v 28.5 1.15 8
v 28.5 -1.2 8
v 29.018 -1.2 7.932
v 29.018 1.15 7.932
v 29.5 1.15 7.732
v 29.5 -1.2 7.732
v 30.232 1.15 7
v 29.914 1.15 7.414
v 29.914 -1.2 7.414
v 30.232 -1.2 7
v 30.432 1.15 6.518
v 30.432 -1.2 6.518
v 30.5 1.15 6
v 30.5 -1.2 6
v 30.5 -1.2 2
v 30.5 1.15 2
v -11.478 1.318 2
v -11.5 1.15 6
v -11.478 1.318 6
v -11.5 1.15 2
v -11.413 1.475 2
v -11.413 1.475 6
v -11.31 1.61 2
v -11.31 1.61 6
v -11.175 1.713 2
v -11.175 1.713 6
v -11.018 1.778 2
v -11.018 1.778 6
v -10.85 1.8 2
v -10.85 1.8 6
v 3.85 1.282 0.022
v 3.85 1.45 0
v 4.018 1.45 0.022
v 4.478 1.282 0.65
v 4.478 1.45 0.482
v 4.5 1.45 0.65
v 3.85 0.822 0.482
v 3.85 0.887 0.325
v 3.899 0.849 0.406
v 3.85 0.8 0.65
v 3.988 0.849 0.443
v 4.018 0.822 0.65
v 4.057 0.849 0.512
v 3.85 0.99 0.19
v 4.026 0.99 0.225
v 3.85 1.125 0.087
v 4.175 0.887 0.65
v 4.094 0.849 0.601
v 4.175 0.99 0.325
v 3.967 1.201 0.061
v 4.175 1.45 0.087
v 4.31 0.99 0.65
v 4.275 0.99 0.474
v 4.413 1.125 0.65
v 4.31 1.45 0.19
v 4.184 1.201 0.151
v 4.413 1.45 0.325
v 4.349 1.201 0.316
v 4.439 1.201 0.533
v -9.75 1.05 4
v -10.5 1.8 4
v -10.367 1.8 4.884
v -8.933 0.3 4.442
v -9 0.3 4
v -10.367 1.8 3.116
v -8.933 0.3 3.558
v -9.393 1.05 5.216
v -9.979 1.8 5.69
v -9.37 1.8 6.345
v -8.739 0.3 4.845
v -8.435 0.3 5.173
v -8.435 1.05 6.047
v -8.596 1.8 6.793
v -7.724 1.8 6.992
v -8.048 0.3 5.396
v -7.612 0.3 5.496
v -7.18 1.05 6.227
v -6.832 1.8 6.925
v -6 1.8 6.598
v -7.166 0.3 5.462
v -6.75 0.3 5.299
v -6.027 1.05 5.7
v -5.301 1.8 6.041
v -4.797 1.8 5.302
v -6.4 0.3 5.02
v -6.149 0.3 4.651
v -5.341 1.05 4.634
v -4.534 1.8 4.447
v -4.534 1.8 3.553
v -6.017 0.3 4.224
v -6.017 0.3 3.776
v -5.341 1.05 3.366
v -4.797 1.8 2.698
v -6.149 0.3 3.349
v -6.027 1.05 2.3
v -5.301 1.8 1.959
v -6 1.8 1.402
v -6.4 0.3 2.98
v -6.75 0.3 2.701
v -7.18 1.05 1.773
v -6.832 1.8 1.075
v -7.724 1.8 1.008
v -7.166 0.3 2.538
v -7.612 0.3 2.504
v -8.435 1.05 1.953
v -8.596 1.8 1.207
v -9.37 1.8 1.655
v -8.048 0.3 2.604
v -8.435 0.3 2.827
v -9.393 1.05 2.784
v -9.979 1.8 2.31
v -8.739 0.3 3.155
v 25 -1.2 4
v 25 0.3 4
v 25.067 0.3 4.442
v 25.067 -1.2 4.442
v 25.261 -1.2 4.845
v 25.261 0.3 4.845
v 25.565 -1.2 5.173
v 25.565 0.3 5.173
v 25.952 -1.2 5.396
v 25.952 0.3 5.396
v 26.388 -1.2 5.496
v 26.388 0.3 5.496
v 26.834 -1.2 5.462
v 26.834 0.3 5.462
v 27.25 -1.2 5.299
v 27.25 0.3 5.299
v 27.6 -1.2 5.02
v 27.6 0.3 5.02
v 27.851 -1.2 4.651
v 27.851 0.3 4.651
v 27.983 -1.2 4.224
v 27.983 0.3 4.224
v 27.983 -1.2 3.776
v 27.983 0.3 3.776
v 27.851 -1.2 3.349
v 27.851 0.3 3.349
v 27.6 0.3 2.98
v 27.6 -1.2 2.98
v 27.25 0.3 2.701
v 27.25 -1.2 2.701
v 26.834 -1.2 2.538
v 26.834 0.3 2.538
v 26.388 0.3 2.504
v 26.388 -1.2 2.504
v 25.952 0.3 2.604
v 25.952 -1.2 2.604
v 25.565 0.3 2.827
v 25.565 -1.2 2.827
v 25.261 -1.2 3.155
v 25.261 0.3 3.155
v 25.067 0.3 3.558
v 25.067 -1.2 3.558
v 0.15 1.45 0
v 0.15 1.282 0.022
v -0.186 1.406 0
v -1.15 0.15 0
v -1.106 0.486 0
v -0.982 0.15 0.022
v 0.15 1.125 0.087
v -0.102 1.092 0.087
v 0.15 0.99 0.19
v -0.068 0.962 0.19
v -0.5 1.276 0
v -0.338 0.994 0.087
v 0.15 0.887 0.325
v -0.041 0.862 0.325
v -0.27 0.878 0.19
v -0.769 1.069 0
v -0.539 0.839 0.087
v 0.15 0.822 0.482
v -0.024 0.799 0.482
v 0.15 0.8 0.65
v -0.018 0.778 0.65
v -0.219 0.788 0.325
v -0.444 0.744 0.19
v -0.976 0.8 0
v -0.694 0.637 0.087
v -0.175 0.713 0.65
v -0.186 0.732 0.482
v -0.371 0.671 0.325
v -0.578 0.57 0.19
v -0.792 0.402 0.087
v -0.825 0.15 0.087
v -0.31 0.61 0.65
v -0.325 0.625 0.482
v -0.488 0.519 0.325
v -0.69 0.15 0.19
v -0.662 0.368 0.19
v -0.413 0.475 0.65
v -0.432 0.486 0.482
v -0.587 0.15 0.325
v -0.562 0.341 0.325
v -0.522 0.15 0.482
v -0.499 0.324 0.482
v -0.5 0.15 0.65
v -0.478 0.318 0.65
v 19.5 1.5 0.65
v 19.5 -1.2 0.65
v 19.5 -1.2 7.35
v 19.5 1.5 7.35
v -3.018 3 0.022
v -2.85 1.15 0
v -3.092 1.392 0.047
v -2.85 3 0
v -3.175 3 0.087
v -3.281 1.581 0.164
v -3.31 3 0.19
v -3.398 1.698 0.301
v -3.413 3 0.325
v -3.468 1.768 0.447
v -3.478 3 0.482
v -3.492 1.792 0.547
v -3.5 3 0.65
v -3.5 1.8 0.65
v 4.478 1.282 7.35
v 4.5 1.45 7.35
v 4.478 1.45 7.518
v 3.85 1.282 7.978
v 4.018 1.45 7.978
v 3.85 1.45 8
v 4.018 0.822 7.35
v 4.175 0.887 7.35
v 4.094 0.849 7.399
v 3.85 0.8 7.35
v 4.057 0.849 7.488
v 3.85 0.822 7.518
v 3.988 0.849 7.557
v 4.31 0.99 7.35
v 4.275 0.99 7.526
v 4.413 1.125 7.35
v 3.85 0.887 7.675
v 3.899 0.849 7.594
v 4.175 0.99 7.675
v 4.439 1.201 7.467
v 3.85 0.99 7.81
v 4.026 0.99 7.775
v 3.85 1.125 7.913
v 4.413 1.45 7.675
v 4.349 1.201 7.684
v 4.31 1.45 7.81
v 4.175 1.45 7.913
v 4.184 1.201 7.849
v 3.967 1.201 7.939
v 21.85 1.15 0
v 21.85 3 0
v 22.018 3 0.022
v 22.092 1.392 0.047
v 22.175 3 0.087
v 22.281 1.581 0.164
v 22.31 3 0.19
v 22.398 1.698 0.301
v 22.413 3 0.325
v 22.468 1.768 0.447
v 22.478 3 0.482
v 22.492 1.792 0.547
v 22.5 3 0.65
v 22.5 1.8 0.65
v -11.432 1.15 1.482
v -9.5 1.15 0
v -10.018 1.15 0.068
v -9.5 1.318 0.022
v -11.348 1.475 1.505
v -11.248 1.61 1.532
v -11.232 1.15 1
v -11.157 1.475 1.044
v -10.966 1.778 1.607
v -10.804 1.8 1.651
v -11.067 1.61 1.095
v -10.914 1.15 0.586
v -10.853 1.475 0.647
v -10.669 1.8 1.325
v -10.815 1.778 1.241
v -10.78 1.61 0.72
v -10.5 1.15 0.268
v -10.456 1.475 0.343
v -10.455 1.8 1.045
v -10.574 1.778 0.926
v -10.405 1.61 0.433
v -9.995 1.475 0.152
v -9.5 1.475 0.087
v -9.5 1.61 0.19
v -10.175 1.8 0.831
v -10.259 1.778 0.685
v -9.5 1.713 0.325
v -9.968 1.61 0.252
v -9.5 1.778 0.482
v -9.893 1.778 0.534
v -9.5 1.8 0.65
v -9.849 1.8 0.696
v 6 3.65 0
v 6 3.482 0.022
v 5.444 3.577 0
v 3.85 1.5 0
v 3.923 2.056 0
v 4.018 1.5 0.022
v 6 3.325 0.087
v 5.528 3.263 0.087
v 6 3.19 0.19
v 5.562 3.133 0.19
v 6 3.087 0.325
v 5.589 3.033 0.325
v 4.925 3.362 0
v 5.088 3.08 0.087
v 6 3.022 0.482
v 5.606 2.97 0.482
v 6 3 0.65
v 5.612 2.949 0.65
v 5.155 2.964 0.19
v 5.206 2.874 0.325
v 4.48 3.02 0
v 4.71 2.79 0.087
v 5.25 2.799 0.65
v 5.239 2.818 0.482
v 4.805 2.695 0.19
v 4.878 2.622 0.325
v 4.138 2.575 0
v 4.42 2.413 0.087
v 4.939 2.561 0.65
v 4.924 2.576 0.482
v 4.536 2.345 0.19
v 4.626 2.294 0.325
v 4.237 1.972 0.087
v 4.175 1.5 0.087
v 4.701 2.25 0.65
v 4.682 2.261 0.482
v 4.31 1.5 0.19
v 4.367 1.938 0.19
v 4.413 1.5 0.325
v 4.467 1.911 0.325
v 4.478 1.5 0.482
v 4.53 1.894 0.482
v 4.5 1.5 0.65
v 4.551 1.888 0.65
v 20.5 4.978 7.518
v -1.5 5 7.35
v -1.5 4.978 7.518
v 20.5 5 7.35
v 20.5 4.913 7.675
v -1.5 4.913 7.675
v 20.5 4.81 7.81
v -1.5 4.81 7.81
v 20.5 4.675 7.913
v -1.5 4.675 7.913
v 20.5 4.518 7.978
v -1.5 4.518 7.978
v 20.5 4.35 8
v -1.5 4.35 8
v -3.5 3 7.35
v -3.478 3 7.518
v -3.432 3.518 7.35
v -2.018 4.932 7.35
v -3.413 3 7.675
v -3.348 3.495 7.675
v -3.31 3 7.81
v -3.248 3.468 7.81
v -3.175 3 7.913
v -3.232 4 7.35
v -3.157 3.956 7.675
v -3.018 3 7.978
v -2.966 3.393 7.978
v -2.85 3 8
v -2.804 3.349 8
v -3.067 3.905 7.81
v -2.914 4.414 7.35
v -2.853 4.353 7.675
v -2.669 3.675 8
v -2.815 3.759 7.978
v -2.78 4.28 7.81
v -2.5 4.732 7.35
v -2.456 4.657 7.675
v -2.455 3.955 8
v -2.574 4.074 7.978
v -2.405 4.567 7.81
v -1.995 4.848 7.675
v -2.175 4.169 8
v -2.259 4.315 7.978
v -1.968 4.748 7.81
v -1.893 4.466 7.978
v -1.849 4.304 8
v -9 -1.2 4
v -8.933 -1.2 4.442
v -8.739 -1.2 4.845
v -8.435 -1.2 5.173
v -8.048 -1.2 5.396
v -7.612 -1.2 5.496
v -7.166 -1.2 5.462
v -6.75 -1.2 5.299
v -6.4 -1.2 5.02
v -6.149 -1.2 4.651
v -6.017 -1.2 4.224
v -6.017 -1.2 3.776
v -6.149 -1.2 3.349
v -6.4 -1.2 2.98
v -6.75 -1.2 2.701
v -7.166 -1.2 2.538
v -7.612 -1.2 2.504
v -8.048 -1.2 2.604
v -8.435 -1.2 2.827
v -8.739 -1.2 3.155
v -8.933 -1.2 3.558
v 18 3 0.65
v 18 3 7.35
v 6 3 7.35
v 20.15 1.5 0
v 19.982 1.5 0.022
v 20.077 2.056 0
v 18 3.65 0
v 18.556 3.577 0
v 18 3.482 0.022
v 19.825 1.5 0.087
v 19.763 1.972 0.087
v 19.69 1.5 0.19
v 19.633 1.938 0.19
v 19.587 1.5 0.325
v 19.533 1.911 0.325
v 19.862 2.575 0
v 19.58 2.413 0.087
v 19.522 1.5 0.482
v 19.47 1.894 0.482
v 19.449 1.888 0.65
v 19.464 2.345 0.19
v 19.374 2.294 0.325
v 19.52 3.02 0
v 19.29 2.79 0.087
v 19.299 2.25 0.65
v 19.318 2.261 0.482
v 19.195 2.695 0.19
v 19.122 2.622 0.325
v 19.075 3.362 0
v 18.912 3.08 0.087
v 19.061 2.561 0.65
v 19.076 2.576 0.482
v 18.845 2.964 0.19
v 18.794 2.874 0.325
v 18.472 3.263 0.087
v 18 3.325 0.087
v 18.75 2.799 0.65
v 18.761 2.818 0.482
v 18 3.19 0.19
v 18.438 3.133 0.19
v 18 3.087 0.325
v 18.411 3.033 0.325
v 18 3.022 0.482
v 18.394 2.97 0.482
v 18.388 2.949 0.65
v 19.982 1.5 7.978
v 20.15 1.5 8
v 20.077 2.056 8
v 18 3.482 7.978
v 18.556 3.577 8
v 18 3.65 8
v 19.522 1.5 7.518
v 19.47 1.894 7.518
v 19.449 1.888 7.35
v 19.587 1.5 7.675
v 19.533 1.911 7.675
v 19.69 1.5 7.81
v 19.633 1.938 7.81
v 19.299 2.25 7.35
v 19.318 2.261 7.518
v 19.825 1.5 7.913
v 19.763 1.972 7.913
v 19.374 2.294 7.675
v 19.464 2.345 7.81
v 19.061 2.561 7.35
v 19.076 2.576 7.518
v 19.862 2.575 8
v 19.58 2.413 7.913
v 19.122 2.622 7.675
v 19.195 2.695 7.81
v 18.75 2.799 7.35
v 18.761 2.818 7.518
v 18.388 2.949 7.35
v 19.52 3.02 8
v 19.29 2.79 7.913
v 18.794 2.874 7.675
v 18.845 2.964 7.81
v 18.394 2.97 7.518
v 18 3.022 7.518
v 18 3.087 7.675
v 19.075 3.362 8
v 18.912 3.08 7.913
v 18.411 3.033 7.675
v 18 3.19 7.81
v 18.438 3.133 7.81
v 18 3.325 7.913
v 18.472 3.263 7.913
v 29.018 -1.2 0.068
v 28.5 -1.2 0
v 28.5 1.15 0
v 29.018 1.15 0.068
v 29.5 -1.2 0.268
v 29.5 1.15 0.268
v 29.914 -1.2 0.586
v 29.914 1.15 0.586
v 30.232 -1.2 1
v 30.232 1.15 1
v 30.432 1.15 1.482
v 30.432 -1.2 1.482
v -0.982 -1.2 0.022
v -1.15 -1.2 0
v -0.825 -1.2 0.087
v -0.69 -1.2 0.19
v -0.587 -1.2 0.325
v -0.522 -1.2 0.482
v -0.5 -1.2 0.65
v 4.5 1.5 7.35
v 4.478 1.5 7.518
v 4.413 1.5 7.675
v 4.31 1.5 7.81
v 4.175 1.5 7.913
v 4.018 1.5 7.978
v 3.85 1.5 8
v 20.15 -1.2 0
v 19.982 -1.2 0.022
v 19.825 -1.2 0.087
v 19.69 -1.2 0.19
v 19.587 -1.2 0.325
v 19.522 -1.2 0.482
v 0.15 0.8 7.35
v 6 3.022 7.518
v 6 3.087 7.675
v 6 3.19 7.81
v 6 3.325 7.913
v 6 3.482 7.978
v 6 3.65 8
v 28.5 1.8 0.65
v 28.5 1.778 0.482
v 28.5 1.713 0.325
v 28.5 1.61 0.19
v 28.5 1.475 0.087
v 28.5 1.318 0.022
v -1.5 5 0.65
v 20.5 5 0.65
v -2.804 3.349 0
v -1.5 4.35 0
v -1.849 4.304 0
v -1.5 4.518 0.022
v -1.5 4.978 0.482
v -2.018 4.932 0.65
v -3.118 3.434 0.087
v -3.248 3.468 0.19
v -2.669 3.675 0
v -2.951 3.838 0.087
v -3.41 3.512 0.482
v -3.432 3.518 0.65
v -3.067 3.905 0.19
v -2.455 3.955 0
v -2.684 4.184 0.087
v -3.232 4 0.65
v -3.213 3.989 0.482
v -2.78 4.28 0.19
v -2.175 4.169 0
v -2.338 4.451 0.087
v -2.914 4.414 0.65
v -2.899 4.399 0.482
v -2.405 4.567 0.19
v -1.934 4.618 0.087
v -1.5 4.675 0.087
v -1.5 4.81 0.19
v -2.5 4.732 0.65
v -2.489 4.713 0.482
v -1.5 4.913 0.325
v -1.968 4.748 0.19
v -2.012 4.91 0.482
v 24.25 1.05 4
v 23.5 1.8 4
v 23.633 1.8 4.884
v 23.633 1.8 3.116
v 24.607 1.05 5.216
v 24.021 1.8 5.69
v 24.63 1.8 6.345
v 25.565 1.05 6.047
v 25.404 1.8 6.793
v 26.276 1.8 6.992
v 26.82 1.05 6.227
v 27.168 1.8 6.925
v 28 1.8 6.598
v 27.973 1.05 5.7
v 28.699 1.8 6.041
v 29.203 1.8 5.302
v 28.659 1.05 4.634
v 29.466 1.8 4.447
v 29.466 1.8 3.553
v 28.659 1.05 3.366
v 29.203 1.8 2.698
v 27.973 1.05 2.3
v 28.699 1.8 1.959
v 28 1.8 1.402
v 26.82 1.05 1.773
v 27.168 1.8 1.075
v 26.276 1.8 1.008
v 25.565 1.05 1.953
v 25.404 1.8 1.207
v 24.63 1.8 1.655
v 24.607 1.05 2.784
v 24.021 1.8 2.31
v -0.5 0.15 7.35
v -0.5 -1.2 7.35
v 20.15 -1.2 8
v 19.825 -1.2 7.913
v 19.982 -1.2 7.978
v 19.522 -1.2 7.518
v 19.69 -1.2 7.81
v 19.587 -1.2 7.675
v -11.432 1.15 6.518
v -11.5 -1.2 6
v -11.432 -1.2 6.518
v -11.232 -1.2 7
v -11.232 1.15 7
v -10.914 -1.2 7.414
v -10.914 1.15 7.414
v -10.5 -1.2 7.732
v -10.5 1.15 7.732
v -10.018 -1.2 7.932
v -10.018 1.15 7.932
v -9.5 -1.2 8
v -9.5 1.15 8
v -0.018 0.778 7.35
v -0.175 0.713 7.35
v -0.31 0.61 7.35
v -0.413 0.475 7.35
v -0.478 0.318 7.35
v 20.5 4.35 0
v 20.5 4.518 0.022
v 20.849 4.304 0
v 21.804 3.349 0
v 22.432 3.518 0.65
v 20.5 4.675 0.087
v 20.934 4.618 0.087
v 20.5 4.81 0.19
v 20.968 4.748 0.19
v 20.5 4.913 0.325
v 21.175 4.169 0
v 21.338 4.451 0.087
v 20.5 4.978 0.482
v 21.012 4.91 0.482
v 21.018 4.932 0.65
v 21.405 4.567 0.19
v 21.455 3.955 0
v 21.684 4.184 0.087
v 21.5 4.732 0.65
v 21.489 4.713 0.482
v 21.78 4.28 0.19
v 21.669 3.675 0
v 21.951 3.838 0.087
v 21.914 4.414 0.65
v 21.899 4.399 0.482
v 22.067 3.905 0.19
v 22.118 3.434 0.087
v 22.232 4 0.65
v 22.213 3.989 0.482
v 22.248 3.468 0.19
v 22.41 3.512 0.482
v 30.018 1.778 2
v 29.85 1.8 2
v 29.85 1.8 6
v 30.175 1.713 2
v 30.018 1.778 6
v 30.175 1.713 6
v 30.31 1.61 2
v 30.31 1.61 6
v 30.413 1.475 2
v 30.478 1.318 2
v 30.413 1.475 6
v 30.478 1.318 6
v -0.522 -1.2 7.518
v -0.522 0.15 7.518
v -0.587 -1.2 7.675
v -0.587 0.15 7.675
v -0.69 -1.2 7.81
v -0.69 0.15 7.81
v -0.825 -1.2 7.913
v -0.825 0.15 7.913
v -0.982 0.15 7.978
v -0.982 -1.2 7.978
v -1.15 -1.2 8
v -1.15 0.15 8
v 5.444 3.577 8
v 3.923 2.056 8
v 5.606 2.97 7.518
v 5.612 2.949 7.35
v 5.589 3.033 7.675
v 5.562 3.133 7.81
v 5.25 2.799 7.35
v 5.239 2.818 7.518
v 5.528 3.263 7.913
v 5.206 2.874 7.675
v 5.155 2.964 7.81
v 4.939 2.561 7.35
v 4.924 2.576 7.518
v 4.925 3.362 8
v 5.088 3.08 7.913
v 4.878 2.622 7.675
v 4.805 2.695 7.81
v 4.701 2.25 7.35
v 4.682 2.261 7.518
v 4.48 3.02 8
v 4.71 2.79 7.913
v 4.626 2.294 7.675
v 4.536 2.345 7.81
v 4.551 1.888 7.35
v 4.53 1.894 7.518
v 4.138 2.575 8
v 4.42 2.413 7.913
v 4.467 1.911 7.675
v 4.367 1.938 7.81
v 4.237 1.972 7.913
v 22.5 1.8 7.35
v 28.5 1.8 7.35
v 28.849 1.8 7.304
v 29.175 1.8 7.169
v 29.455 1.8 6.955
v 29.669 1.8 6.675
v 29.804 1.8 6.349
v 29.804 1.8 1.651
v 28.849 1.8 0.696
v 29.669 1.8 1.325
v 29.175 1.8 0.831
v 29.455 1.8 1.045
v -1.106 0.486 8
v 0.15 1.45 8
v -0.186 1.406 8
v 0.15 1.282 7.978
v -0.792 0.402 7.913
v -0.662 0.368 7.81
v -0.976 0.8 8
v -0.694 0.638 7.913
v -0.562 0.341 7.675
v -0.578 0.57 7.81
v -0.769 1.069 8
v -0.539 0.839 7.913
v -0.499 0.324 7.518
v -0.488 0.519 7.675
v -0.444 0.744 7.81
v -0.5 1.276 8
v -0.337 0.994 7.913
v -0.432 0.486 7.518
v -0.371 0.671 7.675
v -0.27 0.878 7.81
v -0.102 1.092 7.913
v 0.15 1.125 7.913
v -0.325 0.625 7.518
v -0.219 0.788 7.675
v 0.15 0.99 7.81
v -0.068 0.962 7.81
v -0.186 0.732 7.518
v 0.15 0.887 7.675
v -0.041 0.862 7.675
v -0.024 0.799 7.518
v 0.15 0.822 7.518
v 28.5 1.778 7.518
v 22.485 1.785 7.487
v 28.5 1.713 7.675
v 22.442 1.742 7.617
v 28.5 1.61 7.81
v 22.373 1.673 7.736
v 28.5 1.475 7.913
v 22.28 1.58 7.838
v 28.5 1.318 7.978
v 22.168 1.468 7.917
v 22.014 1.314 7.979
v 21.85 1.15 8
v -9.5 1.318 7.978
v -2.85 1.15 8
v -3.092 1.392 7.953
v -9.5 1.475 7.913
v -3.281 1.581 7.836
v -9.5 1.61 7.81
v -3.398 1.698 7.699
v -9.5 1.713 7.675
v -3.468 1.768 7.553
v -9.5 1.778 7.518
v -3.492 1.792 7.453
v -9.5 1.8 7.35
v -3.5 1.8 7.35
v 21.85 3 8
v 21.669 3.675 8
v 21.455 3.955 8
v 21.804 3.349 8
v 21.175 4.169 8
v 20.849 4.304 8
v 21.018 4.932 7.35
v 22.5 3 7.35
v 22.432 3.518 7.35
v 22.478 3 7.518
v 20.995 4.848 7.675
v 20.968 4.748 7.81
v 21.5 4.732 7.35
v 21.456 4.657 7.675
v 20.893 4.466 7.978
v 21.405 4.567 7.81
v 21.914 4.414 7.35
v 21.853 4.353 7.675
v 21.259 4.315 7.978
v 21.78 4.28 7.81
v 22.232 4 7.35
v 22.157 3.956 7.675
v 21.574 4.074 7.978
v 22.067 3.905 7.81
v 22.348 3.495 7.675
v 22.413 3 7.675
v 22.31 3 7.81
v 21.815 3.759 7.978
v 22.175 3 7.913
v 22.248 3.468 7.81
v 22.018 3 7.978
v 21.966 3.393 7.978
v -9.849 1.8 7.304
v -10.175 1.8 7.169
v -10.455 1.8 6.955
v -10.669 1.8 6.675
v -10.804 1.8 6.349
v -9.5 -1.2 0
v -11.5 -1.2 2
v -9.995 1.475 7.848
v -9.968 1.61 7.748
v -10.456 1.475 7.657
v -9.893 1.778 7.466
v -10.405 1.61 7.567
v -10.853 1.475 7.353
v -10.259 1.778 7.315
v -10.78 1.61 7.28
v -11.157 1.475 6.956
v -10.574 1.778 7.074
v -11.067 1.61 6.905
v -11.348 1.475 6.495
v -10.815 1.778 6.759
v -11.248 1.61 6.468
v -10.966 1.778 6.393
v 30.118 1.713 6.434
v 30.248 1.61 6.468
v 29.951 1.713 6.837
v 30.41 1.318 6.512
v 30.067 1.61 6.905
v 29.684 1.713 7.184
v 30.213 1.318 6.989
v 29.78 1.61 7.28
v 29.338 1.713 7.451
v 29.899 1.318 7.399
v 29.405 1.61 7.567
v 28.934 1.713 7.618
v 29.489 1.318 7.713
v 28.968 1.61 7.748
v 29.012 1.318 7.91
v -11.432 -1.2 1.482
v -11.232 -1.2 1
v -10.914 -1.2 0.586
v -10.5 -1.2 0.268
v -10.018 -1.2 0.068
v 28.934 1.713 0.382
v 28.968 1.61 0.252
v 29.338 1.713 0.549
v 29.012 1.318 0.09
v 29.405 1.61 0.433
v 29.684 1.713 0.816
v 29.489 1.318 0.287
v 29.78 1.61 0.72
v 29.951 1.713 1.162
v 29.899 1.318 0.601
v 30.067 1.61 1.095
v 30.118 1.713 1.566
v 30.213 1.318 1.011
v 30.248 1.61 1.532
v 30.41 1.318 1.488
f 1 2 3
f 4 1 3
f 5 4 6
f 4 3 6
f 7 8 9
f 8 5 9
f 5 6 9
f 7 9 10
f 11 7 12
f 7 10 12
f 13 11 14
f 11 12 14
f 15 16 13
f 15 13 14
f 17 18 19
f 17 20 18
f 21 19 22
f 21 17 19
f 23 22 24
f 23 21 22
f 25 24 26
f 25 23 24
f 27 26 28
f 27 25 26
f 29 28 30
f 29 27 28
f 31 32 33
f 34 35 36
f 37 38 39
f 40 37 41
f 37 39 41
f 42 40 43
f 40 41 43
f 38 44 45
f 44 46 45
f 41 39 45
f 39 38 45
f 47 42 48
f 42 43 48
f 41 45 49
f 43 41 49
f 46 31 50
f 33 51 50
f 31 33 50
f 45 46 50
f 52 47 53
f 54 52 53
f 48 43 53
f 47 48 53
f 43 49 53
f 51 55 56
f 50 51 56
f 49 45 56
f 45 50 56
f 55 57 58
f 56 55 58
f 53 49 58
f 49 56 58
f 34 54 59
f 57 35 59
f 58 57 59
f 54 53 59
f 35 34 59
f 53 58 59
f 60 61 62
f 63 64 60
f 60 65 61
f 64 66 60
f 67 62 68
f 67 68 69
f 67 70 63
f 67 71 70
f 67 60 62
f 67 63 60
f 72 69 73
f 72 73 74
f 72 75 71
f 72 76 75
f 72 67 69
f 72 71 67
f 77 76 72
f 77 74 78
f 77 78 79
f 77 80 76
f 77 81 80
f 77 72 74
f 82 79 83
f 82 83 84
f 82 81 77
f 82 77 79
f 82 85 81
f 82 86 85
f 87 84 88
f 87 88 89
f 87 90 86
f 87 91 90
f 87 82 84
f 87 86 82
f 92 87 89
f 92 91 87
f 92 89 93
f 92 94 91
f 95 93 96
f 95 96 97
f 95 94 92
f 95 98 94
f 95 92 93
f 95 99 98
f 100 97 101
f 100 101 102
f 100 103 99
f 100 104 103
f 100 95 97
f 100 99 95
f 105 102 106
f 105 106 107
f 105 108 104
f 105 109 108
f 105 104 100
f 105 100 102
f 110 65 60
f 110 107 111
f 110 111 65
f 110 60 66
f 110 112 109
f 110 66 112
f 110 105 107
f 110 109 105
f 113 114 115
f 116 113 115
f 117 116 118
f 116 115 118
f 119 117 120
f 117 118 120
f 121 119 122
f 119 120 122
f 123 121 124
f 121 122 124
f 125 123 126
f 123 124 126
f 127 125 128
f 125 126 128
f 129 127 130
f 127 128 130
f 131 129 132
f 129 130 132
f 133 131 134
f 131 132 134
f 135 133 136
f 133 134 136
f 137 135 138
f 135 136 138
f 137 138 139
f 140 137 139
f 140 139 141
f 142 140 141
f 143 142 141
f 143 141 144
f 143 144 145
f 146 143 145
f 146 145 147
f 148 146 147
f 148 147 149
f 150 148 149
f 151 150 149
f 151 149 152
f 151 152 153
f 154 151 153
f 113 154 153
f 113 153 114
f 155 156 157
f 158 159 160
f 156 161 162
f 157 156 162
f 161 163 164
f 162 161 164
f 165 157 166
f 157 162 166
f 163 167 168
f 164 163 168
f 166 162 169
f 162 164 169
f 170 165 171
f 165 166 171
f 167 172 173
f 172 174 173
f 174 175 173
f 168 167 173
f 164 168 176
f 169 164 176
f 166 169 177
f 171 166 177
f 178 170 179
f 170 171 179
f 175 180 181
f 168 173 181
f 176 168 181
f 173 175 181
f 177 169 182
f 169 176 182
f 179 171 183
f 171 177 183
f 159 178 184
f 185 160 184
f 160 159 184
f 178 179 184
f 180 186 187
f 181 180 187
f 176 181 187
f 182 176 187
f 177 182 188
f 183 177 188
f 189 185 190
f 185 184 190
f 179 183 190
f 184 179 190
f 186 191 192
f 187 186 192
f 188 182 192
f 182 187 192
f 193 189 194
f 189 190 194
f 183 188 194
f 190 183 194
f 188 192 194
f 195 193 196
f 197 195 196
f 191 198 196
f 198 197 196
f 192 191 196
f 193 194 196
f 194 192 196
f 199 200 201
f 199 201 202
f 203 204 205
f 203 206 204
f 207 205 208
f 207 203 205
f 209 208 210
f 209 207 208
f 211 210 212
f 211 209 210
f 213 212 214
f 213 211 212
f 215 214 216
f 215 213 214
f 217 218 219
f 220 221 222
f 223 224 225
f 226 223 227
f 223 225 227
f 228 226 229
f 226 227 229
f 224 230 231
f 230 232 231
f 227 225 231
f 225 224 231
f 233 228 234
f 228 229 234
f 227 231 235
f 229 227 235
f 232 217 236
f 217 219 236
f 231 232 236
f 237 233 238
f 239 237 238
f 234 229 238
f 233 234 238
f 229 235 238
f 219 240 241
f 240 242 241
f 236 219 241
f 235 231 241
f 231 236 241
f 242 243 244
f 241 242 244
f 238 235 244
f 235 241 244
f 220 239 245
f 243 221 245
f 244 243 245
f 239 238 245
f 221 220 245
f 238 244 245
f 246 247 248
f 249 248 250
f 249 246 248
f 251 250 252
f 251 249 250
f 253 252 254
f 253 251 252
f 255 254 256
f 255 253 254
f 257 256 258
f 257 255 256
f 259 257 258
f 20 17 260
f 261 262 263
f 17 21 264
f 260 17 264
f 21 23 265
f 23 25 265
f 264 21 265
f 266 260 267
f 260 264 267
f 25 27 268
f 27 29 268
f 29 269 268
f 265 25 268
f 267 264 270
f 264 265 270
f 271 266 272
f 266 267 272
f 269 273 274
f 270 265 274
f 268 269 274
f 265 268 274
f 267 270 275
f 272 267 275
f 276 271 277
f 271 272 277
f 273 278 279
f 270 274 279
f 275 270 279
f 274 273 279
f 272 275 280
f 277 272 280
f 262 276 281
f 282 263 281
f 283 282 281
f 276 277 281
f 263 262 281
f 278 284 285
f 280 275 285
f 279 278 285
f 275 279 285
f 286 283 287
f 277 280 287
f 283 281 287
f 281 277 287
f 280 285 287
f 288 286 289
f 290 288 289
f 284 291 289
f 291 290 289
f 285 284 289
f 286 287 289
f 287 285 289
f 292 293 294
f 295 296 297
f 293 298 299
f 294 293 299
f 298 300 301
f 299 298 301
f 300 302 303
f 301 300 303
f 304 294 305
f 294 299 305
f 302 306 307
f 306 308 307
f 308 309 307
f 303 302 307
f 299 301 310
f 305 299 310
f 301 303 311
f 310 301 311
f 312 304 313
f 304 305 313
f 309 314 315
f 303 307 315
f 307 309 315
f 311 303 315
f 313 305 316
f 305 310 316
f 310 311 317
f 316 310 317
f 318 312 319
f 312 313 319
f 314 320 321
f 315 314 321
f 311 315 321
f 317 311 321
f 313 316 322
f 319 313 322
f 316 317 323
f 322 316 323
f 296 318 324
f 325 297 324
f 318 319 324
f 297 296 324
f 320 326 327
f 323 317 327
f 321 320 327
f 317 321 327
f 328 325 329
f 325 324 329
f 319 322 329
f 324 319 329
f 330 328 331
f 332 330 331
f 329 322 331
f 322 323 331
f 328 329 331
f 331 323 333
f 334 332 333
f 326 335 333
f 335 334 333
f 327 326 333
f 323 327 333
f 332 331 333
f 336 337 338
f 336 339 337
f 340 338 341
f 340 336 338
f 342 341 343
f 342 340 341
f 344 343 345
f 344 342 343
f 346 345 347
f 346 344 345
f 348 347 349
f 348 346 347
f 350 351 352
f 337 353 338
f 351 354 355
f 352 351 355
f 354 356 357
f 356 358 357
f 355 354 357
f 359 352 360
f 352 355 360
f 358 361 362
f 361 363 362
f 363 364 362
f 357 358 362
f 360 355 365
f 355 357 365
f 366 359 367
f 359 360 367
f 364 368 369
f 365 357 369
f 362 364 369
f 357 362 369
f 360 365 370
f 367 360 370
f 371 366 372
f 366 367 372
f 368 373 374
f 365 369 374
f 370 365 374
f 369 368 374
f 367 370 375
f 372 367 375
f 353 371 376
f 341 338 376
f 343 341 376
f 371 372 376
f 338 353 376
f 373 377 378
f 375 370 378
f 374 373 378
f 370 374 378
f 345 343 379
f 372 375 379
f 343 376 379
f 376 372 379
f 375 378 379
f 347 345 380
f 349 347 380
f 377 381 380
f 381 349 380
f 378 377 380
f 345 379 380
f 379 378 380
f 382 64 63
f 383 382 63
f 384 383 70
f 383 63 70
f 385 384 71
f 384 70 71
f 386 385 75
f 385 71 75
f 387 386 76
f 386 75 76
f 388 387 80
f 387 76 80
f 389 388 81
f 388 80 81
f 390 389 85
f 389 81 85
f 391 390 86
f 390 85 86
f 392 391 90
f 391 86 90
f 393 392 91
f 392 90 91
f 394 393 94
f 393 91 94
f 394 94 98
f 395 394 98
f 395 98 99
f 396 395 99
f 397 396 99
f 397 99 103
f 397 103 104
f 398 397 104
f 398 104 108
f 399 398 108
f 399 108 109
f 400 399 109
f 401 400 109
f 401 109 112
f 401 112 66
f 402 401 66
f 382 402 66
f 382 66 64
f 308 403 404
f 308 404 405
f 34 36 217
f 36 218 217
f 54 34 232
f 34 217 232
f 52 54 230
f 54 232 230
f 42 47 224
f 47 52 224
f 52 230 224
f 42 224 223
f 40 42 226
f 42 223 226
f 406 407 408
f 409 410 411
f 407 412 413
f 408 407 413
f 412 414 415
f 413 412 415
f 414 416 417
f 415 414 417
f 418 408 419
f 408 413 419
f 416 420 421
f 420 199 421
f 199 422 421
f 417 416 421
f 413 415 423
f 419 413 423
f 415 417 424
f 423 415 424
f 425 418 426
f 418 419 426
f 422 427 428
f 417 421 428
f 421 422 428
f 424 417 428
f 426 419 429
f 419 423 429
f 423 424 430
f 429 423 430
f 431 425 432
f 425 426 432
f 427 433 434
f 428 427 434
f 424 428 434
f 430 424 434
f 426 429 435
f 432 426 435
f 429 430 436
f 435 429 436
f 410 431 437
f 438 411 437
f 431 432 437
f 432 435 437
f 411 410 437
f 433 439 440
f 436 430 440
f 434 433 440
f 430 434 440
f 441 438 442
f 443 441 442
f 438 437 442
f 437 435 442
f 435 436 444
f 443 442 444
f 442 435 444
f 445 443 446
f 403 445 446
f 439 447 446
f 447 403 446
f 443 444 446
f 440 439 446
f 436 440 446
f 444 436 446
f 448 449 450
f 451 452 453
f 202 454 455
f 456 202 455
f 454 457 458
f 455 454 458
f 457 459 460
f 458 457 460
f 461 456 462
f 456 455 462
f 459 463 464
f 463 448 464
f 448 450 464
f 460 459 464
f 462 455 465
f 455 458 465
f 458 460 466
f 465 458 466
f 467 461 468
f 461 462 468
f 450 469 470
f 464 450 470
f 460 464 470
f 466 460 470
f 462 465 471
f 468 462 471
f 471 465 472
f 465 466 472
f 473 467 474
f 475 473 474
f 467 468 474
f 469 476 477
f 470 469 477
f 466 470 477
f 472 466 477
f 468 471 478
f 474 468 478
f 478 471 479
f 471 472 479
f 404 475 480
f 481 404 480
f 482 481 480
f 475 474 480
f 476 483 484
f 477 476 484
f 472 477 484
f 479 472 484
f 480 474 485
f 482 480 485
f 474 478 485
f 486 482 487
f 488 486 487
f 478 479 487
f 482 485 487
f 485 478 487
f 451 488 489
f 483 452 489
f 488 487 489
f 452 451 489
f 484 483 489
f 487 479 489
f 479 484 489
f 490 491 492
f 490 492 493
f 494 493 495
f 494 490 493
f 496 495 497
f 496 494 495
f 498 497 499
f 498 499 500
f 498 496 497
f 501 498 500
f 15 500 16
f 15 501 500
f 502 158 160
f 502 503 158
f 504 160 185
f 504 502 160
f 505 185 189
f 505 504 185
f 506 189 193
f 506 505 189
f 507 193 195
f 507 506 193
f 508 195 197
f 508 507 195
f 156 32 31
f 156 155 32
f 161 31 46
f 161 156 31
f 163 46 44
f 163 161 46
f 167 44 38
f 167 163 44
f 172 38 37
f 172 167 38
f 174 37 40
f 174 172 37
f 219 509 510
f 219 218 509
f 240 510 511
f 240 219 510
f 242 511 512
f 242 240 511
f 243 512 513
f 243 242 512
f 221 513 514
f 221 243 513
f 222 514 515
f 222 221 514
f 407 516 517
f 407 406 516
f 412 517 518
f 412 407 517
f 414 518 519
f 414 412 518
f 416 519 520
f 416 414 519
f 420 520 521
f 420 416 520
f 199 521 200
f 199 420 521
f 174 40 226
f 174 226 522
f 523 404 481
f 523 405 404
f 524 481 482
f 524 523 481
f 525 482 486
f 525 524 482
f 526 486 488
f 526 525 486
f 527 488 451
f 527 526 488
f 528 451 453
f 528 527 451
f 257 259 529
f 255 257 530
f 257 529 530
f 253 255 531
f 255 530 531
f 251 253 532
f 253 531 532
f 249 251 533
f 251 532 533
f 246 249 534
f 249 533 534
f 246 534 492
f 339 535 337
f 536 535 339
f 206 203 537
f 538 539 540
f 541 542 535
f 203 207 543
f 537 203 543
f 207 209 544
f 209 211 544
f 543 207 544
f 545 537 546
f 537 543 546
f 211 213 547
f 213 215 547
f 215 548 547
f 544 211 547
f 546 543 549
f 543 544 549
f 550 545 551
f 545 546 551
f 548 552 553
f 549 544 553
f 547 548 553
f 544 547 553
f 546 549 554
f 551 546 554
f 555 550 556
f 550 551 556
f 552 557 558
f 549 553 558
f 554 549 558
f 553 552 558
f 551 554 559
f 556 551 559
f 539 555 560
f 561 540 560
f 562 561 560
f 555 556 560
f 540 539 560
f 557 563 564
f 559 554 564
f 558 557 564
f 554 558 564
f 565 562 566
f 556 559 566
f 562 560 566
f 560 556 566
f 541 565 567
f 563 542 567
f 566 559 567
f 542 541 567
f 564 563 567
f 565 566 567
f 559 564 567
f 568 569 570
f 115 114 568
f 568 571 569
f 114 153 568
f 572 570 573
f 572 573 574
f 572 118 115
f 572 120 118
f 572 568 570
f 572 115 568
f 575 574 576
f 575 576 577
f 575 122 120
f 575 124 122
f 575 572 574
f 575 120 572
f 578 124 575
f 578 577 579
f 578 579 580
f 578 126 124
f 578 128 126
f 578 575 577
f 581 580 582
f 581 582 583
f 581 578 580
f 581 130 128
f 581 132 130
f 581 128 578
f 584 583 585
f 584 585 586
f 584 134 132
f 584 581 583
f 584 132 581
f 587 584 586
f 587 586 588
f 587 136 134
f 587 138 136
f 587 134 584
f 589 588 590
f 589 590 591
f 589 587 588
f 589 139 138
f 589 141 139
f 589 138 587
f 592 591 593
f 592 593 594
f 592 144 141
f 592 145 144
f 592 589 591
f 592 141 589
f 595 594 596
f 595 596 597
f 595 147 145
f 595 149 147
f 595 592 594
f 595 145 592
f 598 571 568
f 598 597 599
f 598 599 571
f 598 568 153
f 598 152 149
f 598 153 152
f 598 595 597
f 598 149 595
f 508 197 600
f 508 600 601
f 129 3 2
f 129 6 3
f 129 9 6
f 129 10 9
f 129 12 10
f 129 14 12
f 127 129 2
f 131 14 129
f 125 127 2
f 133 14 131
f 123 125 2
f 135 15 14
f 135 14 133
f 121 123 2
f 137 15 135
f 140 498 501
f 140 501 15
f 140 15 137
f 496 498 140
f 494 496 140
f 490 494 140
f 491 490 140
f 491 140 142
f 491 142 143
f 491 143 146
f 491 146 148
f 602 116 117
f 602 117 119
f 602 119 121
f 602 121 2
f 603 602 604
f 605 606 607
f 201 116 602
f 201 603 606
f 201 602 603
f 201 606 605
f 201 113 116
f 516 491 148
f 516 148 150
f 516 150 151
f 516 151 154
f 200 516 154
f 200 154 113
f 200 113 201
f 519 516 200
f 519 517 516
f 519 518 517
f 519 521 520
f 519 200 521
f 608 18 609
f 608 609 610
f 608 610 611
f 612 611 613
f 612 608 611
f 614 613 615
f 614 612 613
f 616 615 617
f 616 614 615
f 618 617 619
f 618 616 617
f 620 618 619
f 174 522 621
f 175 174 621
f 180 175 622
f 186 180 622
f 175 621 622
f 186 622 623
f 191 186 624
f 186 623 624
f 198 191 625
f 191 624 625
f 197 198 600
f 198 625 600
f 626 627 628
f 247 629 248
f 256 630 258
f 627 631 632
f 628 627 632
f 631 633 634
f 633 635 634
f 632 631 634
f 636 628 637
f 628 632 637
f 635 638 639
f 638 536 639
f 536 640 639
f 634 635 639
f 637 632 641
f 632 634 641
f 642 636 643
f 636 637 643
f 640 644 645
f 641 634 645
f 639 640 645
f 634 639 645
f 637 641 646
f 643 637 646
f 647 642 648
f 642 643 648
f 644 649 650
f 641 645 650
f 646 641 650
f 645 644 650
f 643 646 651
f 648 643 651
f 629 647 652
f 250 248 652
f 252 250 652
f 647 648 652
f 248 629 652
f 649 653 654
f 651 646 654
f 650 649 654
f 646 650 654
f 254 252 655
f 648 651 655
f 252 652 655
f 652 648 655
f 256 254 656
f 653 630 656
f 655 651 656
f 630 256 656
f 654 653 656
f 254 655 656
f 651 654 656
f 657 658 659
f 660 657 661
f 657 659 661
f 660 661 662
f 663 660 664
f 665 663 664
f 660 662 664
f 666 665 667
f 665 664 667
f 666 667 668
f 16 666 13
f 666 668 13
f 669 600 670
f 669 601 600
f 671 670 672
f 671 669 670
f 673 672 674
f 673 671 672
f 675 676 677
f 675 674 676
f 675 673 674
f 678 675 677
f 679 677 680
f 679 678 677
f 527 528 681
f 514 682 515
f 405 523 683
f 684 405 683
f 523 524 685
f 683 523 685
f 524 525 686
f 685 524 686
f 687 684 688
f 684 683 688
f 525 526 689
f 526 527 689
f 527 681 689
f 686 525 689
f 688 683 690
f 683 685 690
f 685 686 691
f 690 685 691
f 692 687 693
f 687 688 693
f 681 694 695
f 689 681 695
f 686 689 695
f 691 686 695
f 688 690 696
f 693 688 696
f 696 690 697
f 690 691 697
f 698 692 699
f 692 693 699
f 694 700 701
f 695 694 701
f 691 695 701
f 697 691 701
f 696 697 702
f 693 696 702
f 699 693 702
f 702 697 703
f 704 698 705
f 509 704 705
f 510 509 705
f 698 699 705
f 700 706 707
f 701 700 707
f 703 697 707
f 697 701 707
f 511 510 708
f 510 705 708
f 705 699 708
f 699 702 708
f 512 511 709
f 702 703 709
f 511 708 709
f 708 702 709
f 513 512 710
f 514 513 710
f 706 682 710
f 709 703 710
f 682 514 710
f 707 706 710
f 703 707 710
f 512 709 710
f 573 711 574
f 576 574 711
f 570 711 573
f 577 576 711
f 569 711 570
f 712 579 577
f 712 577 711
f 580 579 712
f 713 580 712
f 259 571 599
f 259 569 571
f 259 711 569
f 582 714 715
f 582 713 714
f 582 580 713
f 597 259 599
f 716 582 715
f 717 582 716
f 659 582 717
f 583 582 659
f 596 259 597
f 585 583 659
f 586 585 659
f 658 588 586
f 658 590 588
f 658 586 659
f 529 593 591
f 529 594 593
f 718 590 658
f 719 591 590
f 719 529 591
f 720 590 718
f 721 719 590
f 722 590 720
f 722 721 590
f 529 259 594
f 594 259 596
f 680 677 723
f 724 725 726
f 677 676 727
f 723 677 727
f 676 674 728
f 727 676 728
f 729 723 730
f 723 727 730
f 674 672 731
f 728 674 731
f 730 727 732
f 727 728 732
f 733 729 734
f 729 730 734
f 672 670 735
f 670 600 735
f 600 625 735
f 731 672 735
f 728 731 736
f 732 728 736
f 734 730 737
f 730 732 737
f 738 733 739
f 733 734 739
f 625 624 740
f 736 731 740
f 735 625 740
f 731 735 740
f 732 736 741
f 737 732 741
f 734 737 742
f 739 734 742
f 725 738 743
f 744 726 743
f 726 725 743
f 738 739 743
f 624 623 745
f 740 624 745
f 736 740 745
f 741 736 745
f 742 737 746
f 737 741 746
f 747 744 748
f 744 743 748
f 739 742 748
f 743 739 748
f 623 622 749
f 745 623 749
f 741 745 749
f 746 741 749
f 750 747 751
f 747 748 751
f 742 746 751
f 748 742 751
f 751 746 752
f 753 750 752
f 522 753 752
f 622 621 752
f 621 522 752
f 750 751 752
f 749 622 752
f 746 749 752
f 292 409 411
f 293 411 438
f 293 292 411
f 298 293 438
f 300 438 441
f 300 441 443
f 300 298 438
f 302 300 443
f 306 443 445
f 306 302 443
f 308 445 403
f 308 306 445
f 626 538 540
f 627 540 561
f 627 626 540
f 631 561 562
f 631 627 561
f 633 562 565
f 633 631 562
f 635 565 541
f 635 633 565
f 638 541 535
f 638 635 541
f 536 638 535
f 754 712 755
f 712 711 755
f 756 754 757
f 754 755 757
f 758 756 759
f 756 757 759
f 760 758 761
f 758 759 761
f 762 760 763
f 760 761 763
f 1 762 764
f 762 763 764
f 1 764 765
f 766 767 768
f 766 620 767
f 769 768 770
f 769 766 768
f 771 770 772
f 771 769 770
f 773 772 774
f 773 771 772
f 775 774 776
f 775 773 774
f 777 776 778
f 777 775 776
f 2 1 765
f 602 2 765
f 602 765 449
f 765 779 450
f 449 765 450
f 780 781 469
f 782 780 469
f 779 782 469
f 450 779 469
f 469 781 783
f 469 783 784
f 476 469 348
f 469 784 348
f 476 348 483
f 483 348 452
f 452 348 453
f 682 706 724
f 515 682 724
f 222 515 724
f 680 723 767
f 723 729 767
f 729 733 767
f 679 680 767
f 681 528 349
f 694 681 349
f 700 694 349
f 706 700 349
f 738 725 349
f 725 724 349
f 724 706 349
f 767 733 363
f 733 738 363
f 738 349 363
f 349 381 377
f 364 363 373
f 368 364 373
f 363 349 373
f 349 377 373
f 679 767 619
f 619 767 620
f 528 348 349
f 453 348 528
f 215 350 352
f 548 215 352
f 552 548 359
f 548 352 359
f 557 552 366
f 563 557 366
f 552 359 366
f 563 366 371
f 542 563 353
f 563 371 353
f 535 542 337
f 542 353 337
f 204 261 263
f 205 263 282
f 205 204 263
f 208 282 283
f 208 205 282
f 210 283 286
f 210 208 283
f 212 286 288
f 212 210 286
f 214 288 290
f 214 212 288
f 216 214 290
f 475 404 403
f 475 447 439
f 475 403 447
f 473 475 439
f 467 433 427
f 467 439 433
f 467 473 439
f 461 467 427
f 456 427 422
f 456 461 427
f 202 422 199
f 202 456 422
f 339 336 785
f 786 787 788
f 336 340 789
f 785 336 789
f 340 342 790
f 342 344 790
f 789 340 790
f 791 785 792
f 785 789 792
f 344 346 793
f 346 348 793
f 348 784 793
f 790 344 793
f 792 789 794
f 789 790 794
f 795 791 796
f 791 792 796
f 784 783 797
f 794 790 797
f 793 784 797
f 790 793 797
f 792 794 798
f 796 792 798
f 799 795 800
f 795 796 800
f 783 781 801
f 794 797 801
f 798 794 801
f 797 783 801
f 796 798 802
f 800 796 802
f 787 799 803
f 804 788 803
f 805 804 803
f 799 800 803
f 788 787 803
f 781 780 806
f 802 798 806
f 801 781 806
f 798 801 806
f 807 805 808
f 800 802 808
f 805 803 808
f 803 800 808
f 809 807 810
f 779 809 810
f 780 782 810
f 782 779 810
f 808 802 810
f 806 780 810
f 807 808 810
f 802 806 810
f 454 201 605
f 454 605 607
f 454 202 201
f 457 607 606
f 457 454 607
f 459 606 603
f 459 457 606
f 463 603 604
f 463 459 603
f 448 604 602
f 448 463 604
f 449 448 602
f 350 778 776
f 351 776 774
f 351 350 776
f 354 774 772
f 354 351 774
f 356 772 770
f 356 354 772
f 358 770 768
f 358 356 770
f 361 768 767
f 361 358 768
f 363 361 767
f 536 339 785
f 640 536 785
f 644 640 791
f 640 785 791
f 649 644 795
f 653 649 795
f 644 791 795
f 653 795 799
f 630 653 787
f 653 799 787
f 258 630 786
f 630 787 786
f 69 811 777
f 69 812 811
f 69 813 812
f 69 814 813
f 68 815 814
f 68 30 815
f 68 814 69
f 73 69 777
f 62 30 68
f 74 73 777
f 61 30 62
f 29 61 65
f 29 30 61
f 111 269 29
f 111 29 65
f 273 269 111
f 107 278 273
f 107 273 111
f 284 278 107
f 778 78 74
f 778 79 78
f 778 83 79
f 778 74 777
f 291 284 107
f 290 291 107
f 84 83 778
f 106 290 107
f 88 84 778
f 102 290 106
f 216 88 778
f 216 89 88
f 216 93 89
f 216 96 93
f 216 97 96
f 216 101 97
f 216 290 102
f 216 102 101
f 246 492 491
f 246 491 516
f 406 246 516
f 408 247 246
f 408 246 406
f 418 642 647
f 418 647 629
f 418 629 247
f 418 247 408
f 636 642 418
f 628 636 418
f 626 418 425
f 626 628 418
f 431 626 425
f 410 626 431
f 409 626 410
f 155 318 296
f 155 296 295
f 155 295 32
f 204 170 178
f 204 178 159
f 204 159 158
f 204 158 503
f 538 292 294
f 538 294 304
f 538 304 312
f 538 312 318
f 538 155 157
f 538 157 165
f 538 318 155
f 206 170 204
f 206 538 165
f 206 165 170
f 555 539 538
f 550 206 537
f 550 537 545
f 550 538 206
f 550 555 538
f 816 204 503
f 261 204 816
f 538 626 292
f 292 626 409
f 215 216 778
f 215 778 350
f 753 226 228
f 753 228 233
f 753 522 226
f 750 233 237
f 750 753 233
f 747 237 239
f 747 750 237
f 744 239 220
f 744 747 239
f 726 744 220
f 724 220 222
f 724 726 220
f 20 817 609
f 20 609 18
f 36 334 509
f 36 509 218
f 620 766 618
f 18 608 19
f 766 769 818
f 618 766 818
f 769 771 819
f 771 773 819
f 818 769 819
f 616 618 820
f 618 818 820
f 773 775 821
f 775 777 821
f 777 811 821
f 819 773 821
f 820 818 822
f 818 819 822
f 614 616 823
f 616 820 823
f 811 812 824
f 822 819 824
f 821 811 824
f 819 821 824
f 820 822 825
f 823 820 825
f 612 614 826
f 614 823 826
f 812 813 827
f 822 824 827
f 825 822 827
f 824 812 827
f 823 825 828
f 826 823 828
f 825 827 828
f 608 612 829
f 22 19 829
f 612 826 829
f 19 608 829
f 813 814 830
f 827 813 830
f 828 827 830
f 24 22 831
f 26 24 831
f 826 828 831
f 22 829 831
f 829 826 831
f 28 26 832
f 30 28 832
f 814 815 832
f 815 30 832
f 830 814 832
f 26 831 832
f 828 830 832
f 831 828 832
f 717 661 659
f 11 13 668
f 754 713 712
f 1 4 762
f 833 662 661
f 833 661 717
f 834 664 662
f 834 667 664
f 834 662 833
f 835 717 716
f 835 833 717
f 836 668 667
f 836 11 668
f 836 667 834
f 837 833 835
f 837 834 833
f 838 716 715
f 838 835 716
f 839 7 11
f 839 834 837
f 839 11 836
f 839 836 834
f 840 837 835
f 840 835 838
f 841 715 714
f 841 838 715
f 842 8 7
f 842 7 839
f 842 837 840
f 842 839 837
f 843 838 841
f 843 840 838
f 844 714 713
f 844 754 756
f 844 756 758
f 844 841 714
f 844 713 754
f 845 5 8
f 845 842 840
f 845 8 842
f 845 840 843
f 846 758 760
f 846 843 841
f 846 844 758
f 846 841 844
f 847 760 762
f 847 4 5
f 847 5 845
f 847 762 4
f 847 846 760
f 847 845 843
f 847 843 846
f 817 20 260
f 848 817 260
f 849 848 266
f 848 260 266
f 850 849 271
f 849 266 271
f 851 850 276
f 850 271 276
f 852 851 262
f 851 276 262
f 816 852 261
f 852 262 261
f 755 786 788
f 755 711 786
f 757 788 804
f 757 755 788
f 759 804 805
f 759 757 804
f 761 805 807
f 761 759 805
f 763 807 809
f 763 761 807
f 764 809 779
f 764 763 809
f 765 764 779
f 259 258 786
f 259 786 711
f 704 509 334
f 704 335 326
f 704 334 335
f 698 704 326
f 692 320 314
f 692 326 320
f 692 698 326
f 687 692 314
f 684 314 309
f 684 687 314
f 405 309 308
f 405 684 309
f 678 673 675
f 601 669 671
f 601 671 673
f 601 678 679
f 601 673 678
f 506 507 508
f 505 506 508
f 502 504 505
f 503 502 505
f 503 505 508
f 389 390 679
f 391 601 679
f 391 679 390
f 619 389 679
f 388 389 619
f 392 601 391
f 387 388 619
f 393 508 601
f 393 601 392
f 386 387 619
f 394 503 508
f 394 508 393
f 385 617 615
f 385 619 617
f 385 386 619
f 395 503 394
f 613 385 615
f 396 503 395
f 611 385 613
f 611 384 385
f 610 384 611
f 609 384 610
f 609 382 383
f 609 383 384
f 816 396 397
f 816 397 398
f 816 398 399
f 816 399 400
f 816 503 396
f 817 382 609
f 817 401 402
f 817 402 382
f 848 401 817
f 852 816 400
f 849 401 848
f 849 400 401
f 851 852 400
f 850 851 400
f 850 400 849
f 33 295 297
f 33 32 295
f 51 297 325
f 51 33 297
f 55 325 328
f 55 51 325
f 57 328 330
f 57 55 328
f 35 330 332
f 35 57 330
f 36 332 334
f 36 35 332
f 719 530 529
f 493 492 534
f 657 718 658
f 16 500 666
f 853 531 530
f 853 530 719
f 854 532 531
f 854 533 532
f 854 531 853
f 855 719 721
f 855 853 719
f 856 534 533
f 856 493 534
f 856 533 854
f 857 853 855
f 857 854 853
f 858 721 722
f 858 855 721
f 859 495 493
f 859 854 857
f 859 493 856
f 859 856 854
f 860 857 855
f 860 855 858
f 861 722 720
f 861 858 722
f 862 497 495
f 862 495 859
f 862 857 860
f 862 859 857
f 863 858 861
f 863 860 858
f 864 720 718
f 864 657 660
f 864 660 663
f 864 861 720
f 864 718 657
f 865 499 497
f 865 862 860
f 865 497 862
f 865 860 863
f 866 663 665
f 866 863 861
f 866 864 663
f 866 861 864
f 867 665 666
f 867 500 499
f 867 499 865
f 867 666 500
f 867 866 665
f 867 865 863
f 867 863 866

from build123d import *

# Parameters (mm, degrees)
RESSALTO_EXTRUS_O1_DEPTH = 8
ESBO_O2_R                = 1.5
CORTE_EXTRUS_O1_DEPTH    = 6
CHANFRO2_SIZE            = 1.5
FILETE1_R                = 2
FILETE2_R                = 1.5
FILETE3_R                = 0.65


with BuildPart() as part:
    # Esboço1 → Ressalto-extrusão1 (new body)
    with BuildSketch(Plane.XY):
        Polygon((-11.5, -1.2), (-11.5, 1.8), (-3.5, 1.8), (-3.5, 5), (22.5, 5), (22.5, 1.8), (30.5, 1.8), (30.5, -1.2), (19.5, -1.2), (19.5, 3), (4.5, 3), (4.5, 0.8), (-0.5, 0.8), (-0.5, -1.2), align=None)
    extrude(amount=RESSALTO_EXTRUS_O1_DEPTH)

    # Esboço2 → Corte-extrusão1 (cut)
    with BuildSketch(Plane(origin=(0, 1.8, 0), x_dir=(1, 0, 0), z_dir=(0, 1, 0))):
        with Locations(Location((-7.5, -4, 0), (0, 0, 180))):
            Circle(ESBO_O2_R)
        with Locations(Location((26.5, -4, 0), (0, 0, 180))):
            Circle(ESBO_O2_R)
    extrude(amount=-CORTE_EXTRUS_O1_DEPTH, mode=Mode.SUBTRACT)

    # Chanfro2
    chanfro2_edges = [part.edges().sort_by_distance(p)[0] for p in [
        (-6, 1.8, 4),
        (28, 1.8, 4),
    ]]
    chamfer(chanfro2_edges, length=CHANFRO2_SIZE)

    # Filete1
    filete1_edges = [part.edges().sort_by_distance(p)[0] for p in [
        (30.5, 0.3, 0),
        (-11.5, 0.3, 0),
        (-11.5, 0.3, 8),
        (-3.5, 5, 4),
        (22.5, 5, 4),
        (30.5, 0.3, 8),
    ]]
    fillet(filete1_edges, radius=FILETE1_R)

    # Filete2
    filete2_edges = [part.edges().sort_by_distance(p)[0] for p in [
        (19.5, 3, 4),
        (4.5, 3, 4),
    ]]
    fillet(filete2_edges, radius=FILETE2_R)

    # Filete3
    filete3_edges = [part.edges().sort_by_distance(p)[0] for p in [
        (12, 3, 0),
        (12, 3, 8),
        (19.5, 0.15, 0),
        (19.5, 0.15, 8),
        (4.939339828, 2.560660172, 0),
        (4.939339828, 2.560660172, 8),
        (19.060660172, 2.560660172, 0),
        (19.060660172, 2.560660172, 8),
        (4.5, 1.15, 0),
        (2, 0.8, 0),
        (-0.5, -0.2, 0),
        (-6.5, 1.8, 0),
        (22.5, 2.4, 0),
        (-6.5, 1.8, 8),
        (4.5, 0.8, 4),
        (-0.5, 0.8, 4),
        (-0.5, -0.2, 8),
        (2, 0.8, 8),
        (4.5, 1.15, 8),
        (30.5, 1.8, 4),
        (25.5, 1.8, 0),
        (25.5, 1.8, 8),
        (29.914213562, 1.8, 7.414213562),
        (29.914213562, 1.8, 0.585786438),
        (-3.5, 2.4, 0),
        (9.5, 5, 0),
        (-2.914213562, 4.414213562, 0),
        (21.914213562, 4.414213562, 0),
        (9.5, 5, 8),
        (-3.5, 2.4, 8),
        (-2.914213562, 4.414213562, 8),
        (21.914213562, 4.414213562, 8),
        (-11.5, 1.8, 4),
        (-10.914213562, 1.8, 7.414213562),
        (-10.914213562, 1.8, 0.585786438),
        (22.5, 2.4, 8),
    ]]
    fillet(filete3_edges, radius=FILETE3_R)


solid = part.part
